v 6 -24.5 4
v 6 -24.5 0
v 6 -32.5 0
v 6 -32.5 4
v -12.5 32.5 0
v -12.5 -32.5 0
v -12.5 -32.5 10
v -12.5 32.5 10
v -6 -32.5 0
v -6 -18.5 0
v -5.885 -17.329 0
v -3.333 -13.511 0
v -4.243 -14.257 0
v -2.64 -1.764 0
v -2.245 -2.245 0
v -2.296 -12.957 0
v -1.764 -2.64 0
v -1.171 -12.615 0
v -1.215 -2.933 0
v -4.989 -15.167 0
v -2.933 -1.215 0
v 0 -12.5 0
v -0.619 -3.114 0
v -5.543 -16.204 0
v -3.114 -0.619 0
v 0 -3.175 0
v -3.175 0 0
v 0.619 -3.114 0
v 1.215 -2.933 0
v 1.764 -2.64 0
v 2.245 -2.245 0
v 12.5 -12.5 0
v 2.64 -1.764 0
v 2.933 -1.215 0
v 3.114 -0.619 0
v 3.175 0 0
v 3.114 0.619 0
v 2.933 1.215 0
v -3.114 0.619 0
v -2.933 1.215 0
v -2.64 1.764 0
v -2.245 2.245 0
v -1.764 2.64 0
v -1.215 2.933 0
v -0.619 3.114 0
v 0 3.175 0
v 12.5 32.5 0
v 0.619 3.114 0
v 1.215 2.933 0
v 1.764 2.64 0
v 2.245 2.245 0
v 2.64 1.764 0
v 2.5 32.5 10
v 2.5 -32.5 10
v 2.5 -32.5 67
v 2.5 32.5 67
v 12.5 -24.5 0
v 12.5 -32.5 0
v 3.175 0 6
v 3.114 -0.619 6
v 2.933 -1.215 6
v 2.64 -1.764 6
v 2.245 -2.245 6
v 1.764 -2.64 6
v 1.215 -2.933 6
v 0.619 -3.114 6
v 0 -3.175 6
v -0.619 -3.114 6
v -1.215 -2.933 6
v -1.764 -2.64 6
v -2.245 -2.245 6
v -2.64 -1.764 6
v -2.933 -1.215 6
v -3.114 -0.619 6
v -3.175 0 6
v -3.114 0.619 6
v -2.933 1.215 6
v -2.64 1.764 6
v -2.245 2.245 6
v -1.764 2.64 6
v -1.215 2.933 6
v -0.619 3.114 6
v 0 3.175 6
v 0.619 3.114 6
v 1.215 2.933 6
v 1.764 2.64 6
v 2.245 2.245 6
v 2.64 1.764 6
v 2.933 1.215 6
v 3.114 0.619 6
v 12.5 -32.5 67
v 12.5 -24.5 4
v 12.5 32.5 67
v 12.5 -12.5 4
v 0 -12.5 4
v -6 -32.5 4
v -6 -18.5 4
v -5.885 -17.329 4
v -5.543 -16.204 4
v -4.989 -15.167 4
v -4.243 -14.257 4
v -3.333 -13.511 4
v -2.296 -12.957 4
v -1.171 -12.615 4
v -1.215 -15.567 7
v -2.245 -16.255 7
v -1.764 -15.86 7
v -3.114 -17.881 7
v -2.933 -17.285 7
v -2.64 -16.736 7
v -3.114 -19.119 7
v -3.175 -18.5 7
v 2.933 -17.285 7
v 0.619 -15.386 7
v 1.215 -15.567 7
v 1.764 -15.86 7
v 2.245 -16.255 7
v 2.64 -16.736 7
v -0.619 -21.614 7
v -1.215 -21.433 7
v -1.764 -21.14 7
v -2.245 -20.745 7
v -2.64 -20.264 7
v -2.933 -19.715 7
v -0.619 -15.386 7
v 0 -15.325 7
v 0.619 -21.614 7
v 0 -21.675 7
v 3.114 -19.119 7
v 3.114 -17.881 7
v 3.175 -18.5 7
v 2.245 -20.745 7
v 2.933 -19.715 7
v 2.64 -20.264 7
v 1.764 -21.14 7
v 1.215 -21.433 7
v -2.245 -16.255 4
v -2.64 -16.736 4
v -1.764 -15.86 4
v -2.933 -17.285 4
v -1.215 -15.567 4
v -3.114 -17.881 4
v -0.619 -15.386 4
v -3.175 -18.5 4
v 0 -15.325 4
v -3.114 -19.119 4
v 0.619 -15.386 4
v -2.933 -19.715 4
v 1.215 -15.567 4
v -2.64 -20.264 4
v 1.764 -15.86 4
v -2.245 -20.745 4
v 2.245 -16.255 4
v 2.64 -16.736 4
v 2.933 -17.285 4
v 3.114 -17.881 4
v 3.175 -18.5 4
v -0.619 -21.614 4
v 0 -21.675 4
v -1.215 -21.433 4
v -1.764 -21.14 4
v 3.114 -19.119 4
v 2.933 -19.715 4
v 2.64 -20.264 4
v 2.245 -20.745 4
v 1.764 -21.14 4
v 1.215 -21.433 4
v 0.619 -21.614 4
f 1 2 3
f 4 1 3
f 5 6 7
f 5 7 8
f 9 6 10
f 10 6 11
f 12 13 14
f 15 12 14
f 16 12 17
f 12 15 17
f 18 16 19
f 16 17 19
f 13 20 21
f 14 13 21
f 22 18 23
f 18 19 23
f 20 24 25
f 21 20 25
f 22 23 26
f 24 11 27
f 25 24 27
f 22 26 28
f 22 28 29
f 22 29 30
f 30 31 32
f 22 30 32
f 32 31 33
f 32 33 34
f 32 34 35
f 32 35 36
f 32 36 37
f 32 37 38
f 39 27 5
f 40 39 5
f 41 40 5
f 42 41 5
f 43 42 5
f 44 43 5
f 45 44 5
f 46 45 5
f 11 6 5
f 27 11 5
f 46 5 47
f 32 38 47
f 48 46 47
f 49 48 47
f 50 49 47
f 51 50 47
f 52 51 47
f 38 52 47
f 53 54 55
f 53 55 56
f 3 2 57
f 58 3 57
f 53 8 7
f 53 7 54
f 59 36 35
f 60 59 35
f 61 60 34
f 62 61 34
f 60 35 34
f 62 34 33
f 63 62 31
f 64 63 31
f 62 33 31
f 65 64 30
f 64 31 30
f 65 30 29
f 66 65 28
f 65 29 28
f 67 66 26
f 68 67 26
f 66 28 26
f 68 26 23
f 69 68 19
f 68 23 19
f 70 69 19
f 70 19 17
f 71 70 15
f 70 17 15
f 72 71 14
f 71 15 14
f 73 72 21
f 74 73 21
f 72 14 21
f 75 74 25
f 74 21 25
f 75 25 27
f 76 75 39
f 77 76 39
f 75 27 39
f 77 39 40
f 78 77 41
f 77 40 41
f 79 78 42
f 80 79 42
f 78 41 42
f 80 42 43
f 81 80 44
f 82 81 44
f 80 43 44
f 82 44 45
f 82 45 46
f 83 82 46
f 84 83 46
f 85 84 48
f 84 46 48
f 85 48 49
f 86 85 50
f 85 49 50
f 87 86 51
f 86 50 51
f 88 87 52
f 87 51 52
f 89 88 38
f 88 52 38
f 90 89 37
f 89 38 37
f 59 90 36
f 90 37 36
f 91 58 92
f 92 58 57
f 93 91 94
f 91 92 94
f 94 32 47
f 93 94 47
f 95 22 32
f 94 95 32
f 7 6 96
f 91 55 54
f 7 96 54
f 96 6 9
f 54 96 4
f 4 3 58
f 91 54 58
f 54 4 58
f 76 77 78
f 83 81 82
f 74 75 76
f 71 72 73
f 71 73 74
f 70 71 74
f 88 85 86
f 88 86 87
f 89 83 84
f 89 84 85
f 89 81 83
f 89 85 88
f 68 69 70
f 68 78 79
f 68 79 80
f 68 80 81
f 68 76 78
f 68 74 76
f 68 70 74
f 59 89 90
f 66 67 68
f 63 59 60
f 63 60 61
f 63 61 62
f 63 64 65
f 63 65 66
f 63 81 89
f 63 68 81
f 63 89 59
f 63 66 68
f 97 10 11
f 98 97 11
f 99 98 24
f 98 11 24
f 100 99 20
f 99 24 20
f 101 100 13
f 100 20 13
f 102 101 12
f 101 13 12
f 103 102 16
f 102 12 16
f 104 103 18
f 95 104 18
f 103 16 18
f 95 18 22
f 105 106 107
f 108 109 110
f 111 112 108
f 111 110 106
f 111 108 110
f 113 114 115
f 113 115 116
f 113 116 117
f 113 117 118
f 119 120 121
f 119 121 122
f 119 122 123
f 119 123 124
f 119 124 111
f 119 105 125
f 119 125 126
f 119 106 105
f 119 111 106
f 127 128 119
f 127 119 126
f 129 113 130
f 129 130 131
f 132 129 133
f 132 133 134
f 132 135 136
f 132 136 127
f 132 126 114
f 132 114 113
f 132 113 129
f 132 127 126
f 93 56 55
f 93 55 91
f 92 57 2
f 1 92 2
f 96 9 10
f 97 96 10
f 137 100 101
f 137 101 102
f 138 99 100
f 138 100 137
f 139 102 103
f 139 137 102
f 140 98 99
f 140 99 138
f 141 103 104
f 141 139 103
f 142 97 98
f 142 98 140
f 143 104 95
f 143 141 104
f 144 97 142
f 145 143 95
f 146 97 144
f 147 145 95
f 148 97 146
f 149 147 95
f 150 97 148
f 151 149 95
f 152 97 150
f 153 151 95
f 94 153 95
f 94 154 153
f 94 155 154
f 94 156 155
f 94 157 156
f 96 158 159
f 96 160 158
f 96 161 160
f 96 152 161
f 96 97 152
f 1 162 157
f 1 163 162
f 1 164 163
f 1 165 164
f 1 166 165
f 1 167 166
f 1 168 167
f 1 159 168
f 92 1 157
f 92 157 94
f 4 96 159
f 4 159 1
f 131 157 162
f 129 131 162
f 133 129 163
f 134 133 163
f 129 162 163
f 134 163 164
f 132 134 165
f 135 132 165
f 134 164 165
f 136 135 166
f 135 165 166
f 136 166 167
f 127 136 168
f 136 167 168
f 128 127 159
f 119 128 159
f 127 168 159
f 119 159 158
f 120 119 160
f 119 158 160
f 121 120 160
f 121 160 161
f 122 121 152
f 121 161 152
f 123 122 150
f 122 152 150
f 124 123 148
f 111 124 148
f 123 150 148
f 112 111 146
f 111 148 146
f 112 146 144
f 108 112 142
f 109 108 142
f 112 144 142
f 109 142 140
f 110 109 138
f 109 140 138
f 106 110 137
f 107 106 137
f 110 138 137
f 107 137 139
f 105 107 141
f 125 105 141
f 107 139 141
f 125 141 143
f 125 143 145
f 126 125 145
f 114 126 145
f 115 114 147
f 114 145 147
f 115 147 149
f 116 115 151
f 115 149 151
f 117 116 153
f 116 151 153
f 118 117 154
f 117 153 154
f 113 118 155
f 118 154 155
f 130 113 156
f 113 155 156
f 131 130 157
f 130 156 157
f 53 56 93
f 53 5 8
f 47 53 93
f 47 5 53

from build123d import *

# Parameters (mm, degrees)
F0_W     = 25
F0_H     = 65
F1_DEPTH = 10
F2_W     = 10
F2_H     = 65
F3_DEPTH = 57
F4_R     = 3.175
F5_DEPTH = 6
F7_DEPTH = 4
F8_R     = 3.175
F9_DEPTH = 3


with BuildPart() as f1:
    # F0 (on Top) → F1 (new body)
    with BuildSketch(Plane.XY):
        Rectangle(F0_W, F0_H)
    extrude(amount=F1_DEPTH)

    # F2 (on face) → F3 (join)
    with BuildSketch(Plane.XY.offset(10)):
        with Locations((7.5, 0)):
            Rectangle(F2_W, F2_H)
    extrude(amount=F3_DEPTH)

    # F4 (on face) → F5 (cut)
    with BuildSketch(Plane(origin=(0, 0, 0), x_dir=(1, 0, 0), z_dir=(0, 0, -1))):
        Circle(F4_R)
    extrude(amount=-F5_DEPTH, mode=Mode.SUBTRACT)

    # F6 (on face) → F7 (cut)
    with BuildSketch(Plane(origin=(0, 0, 0), x_dir=(1, 0, 0), z_dir=(0, 0, -1))):
        with BuildLine():
            Line((6, 24.5), (6, 52.5))
            Line((6, 52.5), (-6, 52.5))
            Line((-6, 52.5), (-6, 18.5))
            ThreePointArc((-6, 18.5), (-4.242641, 14.257359), (0, 12.5))
            ThreePointArc((0, 12.5), (4.242641, 14.257359), (6, 18.5))
            Line((6, 18.5), (6, 24.5))
        make_face()
        with BuildLine():
            Line((29.926794, 24.5), (6, 24.5))
            Line((6, 24.5), (6, 18.5))
            ThreePointArc((6, 18.5), (4.242641, 14.257359), (0, 12.5))
            Line((0, 12.5), (29.926794, 12.5))
            Line((29.926794, 12.5), (29.926794, 24.5))
        make_face()
    extrude(amount=-F7_DEPTH, mode=Mode.SUBTRACT)

    # F8 (on face) → F9 (cut)
    with BuildSketch(Plane(origin=(0, 0, 4), x_dir=(1, 0, 0), z_dir=(0, 0, -1))):
        with Locations((0, 18.5)):
            Circle(F8_R)
    extrude(amount=-F9_DEPTH, mode=Mode.SUBTRACT)


solid = f1.part
